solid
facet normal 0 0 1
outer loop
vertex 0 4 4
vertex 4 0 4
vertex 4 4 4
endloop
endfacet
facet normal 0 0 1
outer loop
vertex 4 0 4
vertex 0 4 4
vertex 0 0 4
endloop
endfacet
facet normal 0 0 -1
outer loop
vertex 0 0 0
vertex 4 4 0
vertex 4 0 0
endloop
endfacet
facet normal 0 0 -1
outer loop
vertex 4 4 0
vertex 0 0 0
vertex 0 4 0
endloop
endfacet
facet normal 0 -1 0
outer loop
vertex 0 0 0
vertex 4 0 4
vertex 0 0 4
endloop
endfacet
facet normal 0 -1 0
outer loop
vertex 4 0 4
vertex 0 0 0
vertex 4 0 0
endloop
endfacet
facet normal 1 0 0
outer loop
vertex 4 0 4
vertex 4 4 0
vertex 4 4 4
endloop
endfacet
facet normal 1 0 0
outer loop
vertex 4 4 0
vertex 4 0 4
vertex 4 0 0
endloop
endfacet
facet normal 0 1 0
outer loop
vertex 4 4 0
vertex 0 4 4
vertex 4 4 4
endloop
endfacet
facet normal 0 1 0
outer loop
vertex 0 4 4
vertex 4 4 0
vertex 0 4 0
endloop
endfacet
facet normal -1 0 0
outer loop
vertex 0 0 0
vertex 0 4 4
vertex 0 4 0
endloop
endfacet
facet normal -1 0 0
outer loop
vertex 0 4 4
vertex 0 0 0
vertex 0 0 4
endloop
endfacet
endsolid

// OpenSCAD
union() {
  translate([0, 0, 0]) cube(size=[4,4,4], center=false);
}
